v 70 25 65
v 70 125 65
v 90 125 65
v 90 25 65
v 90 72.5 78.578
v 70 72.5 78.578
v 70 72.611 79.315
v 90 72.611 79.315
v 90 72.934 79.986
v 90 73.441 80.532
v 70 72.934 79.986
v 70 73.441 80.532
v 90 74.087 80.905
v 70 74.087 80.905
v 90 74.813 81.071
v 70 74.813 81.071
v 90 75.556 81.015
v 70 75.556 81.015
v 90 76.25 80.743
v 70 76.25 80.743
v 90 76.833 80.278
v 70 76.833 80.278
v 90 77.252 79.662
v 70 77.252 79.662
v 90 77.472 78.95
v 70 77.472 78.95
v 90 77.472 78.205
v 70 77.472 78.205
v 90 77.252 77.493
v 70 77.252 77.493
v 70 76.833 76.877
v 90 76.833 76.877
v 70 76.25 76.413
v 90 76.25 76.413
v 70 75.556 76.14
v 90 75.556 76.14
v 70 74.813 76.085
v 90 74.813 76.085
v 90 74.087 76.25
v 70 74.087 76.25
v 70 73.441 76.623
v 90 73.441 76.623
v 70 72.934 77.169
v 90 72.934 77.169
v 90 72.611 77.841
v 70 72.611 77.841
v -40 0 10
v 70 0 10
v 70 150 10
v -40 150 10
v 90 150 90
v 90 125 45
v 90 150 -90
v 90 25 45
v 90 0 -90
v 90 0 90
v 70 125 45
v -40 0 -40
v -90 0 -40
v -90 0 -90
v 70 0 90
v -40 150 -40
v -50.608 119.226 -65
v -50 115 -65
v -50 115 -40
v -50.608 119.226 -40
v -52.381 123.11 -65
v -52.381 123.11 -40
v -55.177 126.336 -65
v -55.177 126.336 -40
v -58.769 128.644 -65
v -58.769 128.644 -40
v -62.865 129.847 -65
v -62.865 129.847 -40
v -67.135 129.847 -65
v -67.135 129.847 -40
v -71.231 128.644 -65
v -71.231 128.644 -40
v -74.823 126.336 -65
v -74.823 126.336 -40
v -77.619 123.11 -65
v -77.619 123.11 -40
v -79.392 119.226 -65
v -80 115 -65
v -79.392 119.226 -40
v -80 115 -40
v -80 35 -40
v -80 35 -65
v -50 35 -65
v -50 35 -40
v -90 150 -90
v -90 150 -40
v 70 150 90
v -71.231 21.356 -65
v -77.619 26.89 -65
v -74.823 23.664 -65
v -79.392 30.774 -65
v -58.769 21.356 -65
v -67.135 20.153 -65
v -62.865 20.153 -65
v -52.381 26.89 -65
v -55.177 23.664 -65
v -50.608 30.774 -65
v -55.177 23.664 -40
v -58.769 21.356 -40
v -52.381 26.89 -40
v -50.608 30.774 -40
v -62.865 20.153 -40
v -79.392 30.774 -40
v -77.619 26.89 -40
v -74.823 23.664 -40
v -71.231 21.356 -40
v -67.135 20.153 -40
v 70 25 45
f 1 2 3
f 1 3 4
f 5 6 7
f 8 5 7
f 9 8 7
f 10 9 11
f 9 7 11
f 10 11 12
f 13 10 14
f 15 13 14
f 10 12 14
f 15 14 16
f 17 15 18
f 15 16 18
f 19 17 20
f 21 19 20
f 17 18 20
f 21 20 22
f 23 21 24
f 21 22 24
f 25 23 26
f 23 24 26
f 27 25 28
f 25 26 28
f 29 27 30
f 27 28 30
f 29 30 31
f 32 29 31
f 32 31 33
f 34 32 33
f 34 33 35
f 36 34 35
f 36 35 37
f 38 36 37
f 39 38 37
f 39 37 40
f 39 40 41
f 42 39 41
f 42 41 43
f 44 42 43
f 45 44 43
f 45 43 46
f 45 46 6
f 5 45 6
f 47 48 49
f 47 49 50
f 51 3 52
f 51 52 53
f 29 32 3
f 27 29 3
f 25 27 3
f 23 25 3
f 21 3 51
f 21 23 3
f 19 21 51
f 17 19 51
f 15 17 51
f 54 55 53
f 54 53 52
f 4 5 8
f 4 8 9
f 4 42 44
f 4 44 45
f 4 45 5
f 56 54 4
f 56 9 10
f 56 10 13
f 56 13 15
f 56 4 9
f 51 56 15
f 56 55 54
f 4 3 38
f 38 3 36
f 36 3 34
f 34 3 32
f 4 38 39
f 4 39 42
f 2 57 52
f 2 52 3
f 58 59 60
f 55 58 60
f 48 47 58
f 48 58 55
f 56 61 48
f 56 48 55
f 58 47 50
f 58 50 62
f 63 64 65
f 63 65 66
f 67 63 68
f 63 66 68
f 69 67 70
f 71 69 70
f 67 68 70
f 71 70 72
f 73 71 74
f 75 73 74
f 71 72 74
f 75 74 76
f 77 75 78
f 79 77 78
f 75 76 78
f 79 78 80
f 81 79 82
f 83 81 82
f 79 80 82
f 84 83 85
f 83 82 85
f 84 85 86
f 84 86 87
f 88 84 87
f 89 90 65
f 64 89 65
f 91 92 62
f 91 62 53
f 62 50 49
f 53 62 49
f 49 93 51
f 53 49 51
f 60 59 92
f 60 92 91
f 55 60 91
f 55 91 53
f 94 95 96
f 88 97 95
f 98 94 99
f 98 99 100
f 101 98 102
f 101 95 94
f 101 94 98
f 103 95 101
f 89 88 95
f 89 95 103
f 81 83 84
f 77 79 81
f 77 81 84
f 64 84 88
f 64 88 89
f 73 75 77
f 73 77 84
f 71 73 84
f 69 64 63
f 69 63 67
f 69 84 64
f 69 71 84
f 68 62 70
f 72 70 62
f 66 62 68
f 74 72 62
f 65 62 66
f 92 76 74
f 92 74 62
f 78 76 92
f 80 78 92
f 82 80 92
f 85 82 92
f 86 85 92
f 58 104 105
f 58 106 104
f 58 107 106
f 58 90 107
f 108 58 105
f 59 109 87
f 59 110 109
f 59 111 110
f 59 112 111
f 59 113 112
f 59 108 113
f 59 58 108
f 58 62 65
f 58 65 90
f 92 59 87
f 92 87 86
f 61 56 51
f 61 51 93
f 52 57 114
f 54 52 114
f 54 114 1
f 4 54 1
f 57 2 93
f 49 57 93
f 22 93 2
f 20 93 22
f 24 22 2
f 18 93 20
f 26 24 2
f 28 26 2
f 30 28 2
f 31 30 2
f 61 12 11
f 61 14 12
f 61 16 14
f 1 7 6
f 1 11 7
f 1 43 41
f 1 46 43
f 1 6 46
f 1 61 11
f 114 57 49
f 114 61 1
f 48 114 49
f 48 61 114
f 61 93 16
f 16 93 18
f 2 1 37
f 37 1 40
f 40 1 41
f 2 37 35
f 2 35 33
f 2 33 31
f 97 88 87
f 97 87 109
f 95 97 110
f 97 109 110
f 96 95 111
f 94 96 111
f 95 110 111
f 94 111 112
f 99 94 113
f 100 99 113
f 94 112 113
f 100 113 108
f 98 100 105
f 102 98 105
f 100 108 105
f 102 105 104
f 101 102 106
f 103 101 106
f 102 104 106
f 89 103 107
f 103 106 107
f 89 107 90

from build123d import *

# Parameters (mm, degrees)
F1_DEPTH = 150
F2_R     = 2.5
F3_DEPTH = 20.001
F4_W     = 100
F4_H     = 20
F5_DEPTH = 20.001
F7_DEPTH = 25


with BuildPart() as f1:
    # F0 (on Front) → F1 (new body)
    with BuildSketch(Plane.XZ):
        Polygon((90, -90), (90, 90), (70, 90), (70, 10), (-40, 10), (-40, -40), (-90, -40), (-90, -90), align=None)
    extrude(amount=-F1_DEPTH)

    # F2 (on face) → F3 (cut, through all)
    with BuildSketch(Plane(origin=(70, 0, 0), x_dir=(0, -1, 0), z_dir=(-1, 0, 0))):
        with Locations((-75, 78.577638)):
            Circle(F2_R)
    extrude(amount=-F3_DEPTH, mode=Mode.SUBTRACT)

    # F4 (on face) → F5 (cut, through all)
    with BuildSketch(Plane(origin=(70, 0, 0), x_dir=(0, -1, 0), z_dir=(-1, 0, 0))):
        with Locations((-75, 55)):
            Rectangle(F4_W, F4_H)
    extrude(amount=-F5_DEPTH, mode=Mode.SUBTRACT)

    # F6 (on face) → F7 (cut)
    with BuildSketch(Plane.XY.offset(-40)):
        with BuildLine():
            Line((-50, 35), (-50, 115))
            ThreePointArc((-50, 115), (-65, 130), (-80, 115))
            Line((-80, 115), (-80, 35))
            ThreePointArc((-80, 35), (-65, 20), (-50, 35))
        make_face()
    extrude(amount=-F7_DEPTH, mode=Mode.SUBTRACT)


solid = f1.part
